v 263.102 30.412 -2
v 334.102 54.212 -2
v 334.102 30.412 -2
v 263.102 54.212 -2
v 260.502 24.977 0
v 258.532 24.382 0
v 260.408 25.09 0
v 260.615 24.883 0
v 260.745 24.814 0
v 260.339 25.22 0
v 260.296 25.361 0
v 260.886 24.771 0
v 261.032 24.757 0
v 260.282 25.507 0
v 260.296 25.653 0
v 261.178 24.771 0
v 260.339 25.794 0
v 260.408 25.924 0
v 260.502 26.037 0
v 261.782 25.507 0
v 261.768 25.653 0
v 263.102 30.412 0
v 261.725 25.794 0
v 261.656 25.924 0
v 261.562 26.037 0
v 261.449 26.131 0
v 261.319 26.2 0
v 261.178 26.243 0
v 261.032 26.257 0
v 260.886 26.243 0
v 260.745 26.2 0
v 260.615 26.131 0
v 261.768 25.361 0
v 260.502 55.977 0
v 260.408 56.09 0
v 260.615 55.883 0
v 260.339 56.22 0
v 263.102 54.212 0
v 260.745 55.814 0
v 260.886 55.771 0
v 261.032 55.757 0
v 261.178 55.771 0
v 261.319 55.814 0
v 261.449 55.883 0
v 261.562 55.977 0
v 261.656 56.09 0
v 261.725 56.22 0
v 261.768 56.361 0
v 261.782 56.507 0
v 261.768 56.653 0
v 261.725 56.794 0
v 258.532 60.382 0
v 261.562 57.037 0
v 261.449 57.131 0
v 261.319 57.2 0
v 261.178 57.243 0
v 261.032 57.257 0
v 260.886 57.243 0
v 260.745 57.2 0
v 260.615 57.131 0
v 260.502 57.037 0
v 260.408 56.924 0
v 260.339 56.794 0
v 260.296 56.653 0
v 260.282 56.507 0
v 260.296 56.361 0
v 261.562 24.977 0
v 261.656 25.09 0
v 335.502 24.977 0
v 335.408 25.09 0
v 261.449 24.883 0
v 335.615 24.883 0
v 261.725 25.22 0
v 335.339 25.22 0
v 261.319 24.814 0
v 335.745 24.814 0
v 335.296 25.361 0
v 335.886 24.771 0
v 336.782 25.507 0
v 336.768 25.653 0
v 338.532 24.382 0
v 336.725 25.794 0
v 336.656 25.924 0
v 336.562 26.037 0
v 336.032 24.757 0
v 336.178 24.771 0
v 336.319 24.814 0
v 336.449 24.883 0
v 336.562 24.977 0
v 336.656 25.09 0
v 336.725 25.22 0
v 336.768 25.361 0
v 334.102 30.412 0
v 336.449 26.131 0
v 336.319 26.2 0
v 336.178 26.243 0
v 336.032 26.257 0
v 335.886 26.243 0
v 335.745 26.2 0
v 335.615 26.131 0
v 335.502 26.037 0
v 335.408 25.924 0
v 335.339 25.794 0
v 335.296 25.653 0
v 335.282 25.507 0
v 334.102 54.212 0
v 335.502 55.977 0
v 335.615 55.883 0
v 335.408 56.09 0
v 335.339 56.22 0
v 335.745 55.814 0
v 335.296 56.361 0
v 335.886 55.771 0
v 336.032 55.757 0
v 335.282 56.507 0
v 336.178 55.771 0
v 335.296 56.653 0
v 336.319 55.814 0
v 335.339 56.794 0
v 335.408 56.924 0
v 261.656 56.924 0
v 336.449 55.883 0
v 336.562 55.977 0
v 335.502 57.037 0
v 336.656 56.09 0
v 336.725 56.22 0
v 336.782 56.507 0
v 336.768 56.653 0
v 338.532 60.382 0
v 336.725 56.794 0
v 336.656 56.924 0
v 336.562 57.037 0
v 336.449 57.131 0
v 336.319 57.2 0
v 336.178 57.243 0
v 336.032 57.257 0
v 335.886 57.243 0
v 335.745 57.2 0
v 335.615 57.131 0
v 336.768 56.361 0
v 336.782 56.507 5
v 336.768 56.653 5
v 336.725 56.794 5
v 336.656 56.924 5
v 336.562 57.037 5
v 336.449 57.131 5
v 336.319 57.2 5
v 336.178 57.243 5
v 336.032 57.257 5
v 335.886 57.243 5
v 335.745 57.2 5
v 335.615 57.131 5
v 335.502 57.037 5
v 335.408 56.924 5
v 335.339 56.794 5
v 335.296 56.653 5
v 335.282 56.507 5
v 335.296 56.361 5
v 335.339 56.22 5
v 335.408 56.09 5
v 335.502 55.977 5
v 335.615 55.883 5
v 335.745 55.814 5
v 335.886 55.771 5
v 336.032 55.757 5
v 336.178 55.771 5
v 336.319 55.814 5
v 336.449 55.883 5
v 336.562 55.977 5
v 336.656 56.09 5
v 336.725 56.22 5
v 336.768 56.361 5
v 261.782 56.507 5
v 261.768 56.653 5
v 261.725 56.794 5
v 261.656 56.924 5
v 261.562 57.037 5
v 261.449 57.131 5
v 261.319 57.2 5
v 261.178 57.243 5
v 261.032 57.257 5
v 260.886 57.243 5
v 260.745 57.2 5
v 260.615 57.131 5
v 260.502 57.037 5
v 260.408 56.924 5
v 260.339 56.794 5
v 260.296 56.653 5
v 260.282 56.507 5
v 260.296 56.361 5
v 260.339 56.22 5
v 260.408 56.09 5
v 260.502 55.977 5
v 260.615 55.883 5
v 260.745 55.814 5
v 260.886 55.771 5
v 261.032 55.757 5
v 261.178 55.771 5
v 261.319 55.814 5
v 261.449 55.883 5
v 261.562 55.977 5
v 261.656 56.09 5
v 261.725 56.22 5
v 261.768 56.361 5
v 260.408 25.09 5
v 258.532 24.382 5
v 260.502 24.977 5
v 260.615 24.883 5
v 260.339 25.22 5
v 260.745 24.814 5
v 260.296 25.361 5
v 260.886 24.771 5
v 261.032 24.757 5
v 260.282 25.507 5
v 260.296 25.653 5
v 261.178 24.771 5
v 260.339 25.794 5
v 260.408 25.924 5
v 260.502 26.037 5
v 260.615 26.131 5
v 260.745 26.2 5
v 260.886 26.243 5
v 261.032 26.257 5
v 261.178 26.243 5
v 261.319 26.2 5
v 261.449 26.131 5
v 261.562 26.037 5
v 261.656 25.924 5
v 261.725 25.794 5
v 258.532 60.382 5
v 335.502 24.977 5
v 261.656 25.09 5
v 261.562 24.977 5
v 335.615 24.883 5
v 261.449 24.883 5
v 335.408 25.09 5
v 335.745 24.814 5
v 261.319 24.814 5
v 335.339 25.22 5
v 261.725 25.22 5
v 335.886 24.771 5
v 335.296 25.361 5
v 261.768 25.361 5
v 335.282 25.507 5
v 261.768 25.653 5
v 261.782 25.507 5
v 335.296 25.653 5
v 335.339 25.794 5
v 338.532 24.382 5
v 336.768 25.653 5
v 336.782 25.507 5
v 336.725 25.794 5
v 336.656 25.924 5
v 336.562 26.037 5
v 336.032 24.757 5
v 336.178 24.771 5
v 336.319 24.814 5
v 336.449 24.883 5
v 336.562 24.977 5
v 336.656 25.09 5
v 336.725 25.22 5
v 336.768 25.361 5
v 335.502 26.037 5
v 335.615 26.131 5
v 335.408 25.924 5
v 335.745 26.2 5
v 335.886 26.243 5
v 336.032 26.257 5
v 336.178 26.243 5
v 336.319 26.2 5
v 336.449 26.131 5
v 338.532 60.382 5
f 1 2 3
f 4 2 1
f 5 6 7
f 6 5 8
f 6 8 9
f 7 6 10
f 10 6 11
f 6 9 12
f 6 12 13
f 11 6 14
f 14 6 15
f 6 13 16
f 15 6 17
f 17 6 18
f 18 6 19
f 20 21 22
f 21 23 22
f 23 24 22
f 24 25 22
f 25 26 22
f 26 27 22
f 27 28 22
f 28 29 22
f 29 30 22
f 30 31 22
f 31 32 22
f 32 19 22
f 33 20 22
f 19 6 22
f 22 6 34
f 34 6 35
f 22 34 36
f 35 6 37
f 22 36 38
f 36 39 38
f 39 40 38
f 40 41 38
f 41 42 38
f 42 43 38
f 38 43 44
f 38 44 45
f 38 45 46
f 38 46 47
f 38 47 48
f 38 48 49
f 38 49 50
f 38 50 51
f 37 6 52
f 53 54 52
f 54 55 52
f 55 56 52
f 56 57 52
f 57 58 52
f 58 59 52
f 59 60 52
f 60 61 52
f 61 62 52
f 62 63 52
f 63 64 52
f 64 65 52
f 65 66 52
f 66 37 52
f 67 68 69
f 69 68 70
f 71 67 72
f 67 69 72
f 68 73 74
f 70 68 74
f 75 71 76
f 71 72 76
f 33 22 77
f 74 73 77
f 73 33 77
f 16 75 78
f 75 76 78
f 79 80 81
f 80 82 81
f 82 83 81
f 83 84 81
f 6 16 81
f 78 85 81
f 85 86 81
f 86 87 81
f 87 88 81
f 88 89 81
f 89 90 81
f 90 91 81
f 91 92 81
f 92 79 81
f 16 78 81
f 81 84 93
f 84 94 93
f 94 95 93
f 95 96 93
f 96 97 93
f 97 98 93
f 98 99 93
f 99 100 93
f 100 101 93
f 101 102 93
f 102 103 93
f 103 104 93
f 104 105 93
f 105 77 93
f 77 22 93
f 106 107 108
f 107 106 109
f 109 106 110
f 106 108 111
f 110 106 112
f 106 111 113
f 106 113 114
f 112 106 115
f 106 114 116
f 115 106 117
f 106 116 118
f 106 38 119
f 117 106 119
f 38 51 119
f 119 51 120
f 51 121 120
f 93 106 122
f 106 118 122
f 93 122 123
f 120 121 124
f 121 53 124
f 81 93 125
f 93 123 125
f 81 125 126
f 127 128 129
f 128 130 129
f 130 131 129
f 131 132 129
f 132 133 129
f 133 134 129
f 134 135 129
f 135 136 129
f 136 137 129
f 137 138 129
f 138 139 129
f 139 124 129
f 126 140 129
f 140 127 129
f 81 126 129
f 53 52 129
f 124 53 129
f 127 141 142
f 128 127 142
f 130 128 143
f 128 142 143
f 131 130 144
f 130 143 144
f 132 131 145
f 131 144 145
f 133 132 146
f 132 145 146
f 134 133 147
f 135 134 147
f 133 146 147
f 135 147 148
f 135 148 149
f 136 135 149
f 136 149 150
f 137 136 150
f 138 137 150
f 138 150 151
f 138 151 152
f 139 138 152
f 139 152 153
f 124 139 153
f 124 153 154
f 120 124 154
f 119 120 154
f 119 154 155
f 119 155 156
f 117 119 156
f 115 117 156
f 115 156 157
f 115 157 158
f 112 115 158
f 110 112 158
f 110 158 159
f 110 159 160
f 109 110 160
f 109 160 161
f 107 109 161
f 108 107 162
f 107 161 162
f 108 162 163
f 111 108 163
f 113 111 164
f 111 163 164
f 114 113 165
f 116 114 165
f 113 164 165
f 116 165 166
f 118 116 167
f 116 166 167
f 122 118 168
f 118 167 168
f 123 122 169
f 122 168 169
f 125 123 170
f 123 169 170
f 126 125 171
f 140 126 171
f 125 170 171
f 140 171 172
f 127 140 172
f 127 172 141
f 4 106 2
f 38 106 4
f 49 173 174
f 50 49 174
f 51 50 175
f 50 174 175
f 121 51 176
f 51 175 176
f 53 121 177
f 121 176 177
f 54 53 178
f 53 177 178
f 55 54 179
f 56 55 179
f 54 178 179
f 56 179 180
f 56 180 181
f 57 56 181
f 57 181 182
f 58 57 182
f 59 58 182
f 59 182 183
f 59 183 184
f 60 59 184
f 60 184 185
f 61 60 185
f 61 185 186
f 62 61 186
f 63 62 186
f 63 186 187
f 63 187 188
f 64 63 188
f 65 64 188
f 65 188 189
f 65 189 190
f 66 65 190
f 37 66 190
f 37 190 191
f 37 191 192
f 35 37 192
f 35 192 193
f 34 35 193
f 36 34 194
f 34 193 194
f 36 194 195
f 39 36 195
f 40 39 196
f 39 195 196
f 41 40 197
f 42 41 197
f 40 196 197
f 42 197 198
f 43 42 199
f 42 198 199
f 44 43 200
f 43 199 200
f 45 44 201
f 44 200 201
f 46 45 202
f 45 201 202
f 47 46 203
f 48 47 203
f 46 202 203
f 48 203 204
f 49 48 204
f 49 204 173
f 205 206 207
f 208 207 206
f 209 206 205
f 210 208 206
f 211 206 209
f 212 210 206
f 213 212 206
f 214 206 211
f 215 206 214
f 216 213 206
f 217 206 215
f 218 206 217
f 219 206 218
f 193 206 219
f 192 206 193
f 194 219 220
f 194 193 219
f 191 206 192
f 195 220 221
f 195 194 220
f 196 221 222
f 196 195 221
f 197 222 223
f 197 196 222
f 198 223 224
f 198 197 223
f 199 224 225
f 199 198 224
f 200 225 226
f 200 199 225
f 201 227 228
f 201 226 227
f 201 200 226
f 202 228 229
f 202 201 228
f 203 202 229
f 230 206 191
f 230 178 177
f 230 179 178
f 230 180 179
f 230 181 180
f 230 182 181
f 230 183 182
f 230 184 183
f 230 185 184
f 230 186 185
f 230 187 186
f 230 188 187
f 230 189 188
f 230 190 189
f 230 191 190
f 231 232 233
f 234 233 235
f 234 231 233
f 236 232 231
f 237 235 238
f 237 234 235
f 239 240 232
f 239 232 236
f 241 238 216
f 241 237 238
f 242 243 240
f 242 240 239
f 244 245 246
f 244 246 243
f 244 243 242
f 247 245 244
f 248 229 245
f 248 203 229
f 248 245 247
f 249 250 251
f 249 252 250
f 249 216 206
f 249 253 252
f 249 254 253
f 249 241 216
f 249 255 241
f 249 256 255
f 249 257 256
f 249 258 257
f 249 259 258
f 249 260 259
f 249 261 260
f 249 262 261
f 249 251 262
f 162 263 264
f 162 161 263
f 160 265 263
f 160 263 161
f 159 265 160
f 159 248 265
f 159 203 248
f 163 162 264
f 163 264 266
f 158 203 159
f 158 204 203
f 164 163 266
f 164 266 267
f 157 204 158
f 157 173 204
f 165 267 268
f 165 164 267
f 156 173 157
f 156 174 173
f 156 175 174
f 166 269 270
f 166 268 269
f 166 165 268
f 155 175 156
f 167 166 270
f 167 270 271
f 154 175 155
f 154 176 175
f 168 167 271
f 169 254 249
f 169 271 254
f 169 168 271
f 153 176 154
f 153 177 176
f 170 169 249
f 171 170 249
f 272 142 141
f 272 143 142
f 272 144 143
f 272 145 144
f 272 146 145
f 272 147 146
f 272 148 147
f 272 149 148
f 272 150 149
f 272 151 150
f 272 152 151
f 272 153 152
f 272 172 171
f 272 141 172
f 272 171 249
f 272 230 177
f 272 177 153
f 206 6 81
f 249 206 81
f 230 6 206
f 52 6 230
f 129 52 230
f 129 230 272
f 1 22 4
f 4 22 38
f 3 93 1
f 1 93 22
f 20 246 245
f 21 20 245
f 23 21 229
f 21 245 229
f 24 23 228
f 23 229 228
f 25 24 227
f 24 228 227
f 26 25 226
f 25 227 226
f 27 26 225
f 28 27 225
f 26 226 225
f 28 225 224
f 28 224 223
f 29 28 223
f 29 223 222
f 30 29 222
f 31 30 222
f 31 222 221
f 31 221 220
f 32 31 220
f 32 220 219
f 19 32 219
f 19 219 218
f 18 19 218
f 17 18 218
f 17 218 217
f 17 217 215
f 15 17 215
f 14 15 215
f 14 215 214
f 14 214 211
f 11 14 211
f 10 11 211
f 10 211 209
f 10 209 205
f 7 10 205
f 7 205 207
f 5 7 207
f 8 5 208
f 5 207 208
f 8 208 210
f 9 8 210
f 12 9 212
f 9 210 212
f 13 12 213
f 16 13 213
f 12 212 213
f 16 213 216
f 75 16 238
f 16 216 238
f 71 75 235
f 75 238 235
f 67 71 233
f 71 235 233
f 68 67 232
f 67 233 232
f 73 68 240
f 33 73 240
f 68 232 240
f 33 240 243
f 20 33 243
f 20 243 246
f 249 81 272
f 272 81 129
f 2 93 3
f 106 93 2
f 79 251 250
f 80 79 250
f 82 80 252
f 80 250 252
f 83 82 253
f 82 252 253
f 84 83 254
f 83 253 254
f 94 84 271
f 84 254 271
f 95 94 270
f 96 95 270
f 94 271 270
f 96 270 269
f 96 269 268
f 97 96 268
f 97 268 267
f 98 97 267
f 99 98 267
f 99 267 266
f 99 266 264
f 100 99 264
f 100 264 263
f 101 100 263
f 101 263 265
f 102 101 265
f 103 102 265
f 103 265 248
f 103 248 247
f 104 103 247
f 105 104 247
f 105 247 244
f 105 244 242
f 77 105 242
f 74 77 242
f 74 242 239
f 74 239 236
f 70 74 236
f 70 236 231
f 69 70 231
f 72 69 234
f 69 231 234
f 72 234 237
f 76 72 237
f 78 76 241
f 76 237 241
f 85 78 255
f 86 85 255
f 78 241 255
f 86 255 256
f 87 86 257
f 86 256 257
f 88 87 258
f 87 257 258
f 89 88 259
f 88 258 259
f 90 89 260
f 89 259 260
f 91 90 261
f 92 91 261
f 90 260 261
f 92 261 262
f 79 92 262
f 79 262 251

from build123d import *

# Parameters (mm, degrees)
SKETCH1_W           = 80
SKETCH1_H           = 36
BOSS_EXTRUDE1_DEPTH = 5
SKETCH2_W           = 71
SKETCH2_H           = 23.8
BOSS_EXTRUDE2_DEPTH = 2
CUT_EXTRUDE1_REACH  = 345.946
SKETCH3_R           = 0.75


with BuildPart() as part:
    # Sketch1 → Boss-Extrude1 (new body)
    with BuildSketch(Plane.XY):
        with Locations((298.531964754, 42.3820547)):
            Rectangle(SKETCH1_W, SKETCH1_H)
    extrude(amount=BOSS_EXTRUDE1_DEPTH)

    # Sketch2 → Boss-Extrude2 (add)
    with BuildSketch(Plane(origin=(0, 0, 0), x_dir=(-1, 0, 0), z_dir=(0, 0, -1))):
        with Locations((-298.601806293, 42.312213161)):
            Rectangle(SKETCH2_W, SKETCH2_H)
    extrude(amount=BOSS_EXTRUDE2_DEPTH)

    # Sketch3 → Cut-Extrude1 (cut, up to next)
    with BuildSketch(Plane.XY.offset(5), mode=Mode.PRIVATE) as cut_extrude1_sk1:
        with Locations((261.031964754, 25.5070547)):
            Circle(SKETCH3_R)
    cut_extrude1_tool1 = extrude(cut_extrude1_sk1.sketch, amount=-CUT_EXTRUDE1_REACH, mode=Mode.PRIVATE) & part.part
    # Sketch3 → Cut-Extrude1 (cut, up to next)
    with BuildSketch(Plane.XY.offset(5), mode=Mode.PRIVATE) as cut_extrude1_sk2:
        with Locations((336.031964754, 25.5070547)):
            Circle(SKETCH3_R)
    cut_extrude1_tool2 = extrude(cut_extrude1_sk2.sketch, amount=-CUT_EXTRUDE1_REACH, mode=Mode.PRIVATE) & part.part
    # Sketch3 → Cut-Extrude1 (cut, up to next)
    with BuildSketch(Plane.XY.offset(5), mode=Mode.PRIVATE) as cut_extrude1_sk3:
        with Locations((336.031964754, 56.5070547)):
            Circle(SKETCH3_R)
    cut_extrude1_tool3 = extrude(cut_extrude1_sk3.sketch, amount=-CUT_EXTRUDE1_REACH, mode=Mode.PRIVATE) & part.part
    # Sketch3 → Cut-Extrude1 (cut, up to next)
    with BuildSketch(Plane.XY.offset(5), mode=Mode.PRIVATE) as cut_extrude1_sk4:
        with Locations((261.031964754, 56.5070547)):
            Circle(SKETCH3_R)
    cut_extrude1_tool4 = extrude(cut_extrude1_sk4.sketch, amount=-CUT_EXTRUDE1_REACH, mode=Mode.PRIVATE) & part.part
    add(cut_extrude1_tool1.solids().sort_by_distance((261.031965, 25.507055, 5))[0], mode=Mode.SUBTRACT)
    add(cut_extrude1_tool2.solids().sort_by_distance((336.031965, 25.507055, 5))[0], mode=Mode.SUBTRACT)
    add(cut_extrude1_tool3.solids().sort_by_distance((336.031965, 56.507055, 5))[0], mode=Mode.SUBTRACT)
    add(cut_extrude1_tool4.solids().sort_by_distance((261.031965, 56.507055, 5))[0], mode=Mode.SUBTRACT)


solid = part.part
